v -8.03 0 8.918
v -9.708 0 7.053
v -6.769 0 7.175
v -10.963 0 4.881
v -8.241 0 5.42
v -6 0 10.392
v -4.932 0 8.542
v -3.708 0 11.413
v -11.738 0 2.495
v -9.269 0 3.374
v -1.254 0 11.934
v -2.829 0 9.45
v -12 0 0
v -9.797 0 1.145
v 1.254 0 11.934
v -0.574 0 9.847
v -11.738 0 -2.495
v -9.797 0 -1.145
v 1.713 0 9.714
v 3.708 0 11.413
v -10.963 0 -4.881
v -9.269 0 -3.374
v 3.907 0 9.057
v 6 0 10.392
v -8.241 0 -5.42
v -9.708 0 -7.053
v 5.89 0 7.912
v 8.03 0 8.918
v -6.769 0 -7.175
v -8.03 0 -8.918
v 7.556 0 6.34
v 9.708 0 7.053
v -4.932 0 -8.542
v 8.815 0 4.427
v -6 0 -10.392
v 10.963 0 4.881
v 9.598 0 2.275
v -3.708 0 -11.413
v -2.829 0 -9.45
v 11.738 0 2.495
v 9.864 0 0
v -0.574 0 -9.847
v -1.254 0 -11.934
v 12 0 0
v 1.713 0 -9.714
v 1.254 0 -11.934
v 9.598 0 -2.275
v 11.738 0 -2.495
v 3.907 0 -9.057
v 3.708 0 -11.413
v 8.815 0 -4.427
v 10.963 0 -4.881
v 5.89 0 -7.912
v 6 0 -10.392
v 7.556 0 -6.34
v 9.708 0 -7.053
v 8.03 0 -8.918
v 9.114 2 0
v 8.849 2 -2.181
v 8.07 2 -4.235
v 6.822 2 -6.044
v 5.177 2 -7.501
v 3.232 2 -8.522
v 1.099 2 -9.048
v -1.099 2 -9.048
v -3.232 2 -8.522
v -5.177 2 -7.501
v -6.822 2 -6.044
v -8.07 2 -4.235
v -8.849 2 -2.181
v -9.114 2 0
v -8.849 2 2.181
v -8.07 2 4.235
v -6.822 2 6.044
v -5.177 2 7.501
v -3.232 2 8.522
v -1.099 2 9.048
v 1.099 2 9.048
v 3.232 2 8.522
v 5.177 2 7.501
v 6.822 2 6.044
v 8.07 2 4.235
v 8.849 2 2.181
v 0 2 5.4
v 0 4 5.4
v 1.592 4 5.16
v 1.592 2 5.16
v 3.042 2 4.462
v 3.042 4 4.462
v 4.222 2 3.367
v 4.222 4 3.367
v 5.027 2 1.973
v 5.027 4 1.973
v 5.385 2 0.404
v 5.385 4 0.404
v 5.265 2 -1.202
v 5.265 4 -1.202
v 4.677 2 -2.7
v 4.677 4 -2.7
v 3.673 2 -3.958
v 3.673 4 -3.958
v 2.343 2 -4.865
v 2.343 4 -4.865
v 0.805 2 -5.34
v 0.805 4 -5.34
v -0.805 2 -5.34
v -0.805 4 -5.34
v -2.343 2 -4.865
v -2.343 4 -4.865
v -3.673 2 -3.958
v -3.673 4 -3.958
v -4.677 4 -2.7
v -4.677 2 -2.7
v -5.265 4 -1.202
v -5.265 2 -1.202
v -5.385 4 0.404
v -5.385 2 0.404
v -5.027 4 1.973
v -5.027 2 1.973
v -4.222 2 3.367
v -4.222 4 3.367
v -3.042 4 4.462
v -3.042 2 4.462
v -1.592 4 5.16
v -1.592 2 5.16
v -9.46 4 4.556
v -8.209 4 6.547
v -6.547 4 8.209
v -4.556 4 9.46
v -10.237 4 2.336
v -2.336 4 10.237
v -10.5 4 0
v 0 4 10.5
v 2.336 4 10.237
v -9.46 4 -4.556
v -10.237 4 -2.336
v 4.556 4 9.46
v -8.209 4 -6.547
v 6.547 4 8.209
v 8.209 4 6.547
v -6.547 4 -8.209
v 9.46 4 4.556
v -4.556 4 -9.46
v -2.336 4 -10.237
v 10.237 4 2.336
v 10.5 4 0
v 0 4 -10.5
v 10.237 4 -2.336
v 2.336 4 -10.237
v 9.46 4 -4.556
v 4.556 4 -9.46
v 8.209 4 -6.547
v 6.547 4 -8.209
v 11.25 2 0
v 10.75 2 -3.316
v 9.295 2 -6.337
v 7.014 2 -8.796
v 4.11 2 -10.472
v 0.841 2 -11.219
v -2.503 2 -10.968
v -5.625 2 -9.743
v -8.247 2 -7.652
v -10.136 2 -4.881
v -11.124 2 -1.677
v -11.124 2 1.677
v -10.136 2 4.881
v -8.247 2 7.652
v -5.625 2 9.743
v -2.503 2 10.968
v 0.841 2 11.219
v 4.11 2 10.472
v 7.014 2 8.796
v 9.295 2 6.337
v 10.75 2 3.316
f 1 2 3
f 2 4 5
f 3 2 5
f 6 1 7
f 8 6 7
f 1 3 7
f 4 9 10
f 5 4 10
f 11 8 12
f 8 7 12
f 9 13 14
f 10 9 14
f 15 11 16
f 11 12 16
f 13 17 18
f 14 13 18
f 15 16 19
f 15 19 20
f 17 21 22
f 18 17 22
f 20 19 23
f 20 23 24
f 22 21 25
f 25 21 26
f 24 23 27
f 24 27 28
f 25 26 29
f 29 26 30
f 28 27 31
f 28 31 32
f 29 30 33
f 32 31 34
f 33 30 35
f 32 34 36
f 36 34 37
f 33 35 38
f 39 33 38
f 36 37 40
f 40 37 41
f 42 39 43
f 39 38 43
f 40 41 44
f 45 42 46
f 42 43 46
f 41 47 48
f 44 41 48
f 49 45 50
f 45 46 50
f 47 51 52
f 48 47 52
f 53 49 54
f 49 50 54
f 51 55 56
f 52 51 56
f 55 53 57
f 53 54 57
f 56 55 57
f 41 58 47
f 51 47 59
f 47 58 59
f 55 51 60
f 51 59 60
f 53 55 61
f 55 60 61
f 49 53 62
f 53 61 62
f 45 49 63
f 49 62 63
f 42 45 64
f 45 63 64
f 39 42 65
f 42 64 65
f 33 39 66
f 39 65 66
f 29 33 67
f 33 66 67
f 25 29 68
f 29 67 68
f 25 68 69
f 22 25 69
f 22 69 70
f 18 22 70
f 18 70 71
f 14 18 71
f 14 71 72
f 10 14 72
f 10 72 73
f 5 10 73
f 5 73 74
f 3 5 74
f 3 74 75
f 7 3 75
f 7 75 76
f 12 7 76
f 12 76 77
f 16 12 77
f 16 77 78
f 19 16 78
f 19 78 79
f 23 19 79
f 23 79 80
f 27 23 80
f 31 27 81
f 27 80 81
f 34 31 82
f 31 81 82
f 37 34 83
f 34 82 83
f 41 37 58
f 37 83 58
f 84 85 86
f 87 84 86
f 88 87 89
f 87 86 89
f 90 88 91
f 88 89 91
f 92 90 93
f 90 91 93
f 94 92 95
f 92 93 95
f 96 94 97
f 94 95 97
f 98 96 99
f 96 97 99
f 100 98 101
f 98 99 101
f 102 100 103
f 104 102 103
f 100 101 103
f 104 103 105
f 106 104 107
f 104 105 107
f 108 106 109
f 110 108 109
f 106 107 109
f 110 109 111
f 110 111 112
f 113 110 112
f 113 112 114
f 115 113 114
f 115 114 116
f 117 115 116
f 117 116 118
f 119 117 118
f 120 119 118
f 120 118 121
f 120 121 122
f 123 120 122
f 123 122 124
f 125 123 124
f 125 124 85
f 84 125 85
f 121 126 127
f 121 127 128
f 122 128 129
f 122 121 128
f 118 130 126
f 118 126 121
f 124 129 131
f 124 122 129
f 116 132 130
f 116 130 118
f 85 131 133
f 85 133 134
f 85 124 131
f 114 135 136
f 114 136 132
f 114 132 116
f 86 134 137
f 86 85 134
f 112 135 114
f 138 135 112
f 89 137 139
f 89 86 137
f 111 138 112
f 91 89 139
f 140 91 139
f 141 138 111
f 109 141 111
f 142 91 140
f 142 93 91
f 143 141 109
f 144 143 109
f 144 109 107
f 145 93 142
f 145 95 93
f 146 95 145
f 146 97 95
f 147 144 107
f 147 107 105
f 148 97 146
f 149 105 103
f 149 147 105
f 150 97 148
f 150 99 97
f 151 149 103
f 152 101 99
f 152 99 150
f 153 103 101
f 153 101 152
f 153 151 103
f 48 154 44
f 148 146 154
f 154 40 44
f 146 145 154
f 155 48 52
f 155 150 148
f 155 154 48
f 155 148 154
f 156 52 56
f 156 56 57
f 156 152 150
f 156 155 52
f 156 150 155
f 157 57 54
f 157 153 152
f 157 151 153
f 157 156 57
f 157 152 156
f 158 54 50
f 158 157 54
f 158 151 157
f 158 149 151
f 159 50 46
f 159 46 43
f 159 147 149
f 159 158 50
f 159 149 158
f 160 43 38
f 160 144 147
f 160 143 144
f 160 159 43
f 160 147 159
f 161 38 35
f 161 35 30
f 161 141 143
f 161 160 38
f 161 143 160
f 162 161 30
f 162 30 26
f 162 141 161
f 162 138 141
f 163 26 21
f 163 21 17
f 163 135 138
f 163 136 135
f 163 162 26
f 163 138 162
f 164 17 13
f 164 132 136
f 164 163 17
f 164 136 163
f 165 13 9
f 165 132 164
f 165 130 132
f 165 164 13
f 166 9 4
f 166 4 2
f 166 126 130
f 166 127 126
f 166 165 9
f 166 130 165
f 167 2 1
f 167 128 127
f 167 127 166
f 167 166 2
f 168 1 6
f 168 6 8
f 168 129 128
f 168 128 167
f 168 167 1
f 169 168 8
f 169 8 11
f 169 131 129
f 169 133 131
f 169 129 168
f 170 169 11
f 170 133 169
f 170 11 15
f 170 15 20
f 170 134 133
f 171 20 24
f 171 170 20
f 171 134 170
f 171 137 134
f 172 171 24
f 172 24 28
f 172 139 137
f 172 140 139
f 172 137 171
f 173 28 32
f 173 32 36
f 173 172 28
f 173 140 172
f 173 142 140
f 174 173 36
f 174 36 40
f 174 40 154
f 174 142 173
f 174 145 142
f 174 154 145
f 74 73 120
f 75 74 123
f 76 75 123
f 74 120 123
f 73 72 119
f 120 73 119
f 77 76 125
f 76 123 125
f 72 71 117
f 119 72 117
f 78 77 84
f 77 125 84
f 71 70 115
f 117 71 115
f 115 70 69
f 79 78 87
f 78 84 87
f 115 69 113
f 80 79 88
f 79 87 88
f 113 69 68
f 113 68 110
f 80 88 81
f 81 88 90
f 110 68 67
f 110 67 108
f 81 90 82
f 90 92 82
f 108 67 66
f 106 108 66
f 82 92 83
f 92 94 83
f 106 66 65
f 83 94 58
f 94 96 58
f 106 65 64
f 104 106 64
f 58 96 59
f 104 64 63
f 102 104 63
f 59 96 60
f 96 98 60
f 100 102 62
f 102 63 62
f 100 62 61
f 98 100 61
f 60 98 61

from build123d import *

# Parameters (mm, degrees)
SKETCH_1_R          = 12
SKETCH_2_R          = 10.5
SHELL_2_T           = -2
SKETCH_3_R          = 5.4
CUT_EXTRUDE_2_DEPTH = 18.435595935


with BuildPart() as part:
    # 草图1 → 放样1 section 0
    with BuildSketch(Plane(origin=(0, 0, 0), x_dir=(1, 0, 0), z_dir=(0, 1, 0))):
        Circle(SKETCH_1_R)
    # 草图2 → 放样1 section 1
    with BuildSketch(Plane(origin=(0, 4, 0), x_dir=(1, 0, 0), z_dir=(0, 1, 0))):
        Circle(SKETCH_2_R)
    loft()

    # 抽壳2
    shell_2_openings = [part.faces().sort_by_distance(p)[0] for p in [
        (0, 0, 0),
    ]]
    offset(amount=SHELL_2_T, openings=shell_2_openings, kind=Kind.INTERSECTION)

    # 草图3 → 切除-拉伸2 (cut, through all)
    with BuildSketch(Plane(origin=(0, 4, 0), x_dir=(1, 0, 0), z_dir=(0, 1, 0))):
        with Locations(Location((0, 0, 0), (0, 0, 270))):
            Circle(SKETCH_3_R)
    extrude(amount=-CUT_EXTRUDE_2_DEPTH, mode=Mode.SUBTRACT)


solid = part.part
